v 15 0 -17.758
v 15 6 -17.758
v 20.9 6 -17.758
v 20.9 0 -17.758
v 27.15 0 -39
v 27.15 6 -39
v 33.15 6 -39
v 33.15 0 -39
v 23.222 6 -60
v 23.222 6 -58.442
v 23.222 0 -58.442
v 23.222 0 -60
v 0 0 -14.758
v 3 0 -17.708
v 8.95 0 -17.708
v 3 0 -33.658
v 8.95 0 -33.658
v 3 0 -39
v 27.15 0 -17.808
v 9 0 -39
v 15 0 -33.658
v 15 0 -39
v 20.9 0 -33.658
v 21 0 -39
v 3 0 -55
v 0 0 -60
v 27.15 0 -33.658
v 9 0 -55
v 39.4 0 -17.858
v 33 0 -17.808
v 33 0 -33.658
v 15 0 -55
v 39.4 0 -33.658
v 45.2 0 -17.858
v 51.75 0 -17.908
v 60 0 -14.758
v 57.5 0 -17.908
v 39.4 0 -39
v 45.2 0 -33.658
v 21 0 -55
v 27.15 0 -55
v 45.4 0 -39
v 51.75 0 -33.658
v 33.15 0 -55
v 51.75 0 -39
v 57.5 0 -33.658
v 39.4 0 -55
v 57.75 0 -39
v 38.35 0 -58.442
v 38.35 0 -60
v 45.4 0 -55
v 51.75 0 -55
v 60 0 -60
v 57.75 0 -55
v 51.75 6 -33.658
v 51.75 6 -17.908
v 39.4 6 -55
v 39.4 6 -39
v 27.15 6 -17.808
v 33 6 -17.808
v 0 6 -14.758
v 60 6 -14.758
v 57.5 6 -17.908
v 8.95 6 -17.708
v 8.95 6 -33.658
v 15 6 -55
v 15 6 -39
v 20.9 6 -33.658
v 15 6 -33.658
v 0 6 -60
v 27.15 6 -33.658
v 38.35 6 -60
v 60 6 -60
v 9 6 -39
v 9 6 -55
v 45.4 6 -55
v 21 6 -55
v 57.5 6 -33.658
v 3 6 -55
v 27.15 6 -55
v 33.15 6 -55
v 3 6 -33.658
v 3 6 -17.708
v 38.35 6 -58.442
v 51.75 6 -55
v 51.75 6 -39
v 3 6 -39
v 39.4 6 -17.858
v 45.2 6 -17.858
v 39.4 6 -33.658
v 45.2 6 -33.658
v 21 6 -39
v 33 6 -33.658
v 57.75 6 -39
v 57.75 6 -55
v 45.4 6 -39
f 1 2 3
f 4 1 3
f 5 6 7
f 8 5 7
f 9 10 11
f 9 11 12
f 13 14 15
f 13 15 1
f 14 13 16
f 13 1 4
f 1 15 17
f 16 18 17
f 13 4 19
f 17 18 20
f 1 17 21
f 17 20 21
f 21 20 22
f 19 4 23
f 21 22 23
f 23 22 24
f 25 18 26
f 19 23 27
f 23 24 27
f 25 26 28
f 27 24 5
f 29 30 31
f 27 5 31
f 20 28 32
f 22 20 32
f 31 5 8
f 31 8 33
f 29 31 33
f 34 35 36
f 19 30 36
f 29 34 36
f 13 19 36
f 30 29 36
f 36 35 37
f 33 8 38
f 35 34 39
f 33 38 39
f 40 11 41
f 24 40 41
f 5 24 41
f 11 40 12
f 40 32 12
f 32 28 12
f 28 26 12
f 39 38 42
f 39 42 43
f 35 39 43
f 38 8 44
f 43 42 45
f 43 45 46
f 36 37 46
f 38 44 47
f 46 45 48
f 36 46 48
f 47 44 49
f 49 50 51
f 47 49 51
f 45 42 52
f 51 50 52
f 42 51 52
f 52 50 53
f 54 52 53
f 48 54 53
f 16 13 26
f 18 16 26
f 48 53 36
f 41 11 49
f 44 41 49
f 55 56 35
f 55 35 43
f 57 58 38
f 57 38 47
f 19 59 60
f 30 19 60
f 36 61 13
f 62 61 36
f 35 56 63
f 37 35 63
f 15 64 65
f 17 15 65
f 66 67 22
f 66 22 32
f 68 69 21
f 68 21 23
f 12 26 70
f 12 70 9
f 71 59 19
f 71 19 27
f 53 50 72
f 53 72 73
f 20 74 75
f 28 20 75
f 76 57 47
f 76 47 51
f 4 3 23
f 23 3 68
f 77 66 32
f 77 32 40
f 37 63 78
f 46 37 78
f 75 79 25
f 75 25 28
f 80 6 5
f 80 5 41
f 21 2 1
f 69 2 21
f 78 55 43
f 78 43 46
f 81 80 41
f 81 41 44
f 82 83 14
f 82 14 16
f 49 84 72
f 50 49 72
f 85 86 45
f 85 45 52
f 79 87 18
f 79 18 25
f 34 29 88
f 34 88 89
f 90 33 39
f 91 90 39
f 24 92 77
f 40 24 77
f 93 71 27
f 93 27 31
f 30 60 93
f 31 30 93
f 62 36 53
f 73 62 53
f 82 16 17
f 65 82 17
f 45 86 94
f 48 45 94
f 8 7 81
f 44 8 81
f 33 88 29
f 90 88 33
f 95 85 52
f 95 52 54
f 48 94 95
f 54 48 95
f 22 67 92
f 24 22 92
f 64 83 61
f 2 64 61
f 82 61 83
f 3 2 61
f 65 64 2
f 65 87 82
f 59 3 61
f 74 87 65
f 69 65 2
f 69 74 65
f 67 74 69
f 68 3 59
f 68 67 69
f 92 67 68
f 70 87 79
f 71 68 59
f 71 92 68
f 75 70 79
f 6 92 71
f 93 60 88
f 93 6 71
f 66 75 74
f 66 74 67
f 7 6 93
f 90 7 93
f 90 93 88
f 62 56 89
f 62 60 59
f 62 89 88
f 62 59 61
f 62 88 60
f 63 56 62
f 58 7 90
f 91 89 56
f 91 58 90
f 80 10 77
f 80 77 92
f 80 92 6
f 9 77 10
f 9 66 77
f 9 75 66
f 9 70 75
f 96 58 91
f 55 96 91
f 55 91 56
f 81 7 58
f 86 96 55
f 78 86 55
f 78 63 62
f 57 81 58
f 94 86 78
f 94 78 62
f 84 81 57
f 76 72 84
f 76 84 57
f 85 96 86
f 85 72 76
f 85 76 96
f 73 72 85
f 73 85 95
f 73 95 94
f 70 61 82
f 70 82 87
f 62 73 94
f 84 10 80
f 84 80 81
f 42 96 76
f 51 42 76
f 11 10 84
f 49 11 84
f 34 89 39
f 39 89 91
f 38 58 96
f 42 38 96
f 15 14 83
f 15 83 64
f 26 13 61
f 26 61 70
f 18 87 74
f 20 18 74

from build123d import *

# Parameters (mm, degrees)
SKETCH1_W           = 60
SKETCH1_H           = 60
BOSS_EXTRUDE1_DEPTH = 6
SKETCH2_W           = 6
SKETCH2_H           = 16
SKETCH2_W_2         = 5.95
SKETCH2_H_2         = 15.95
SKETCH2_W_3         = 5.9
SKETCH2_H_3         = 15.9
SKETCH2_W_4         = 5.85
SKETCH2_H_4         = 15.85
SKETCH2_W_5         = 5.8
SKETCH2_H_5         = 15.8
SKETCH2_W_6         = 5.75
SKETCH2_H_6         = 15.75
CUT_EXTRUDE1_DEPTH  = 6
SKETCH3_W           = 15.128686335
SKETCH3_H           = 1.558081165
CUT_EXTRUDE2_DEPTH  = 6
SKETCH4_W           = 60
SKETCH4_H           = 14.757524832
CUT_EXTRUDE3_DEPTH  = 6


with BuildPart() as part:
    # Sketch1 → Boss-Extrude1 (new body)
    with BuildSketch(Plane(origin=(0, 0, 0), x_dir=(1, 0, 0), z_dir=(0, 1, 0))):
        with Locations((30, 30)):
            Rectangle(SKETCH1_W, SKETCH1_H)
    extrude(amount=BOSS_EXTRUDE1_DEPTH)

    # Sketch2 → Cut-Extrude1 (cut)
    with BuildSketch(Plane(origin=(0, 6, 0), x_dir=(1, 0, 0), z_dir=(0, 1, 0))):
        with Locations((6, 47)):
            Rectangle(SKETCH2_W, SKETCH2_H)
        with Locations((18, 47)):
            Rectangle(SKETCH2_W, SKETCH2_H)
        with Locations((30.15, 47)):
            Rectangle(SKETCH2_W, SKETCH2_H)
        with Locations((42.4, 47)):
            Rectangle(SKETCH2_W, SKETCH2_H)
        with Locations((54.75, 47)):
            Rectangle(SKETCH2_W, SKETCH2_H)
        with Locations((5.975, 25.682524832)):
            Rectangle(SKETCH2_W_2, SKETCH2_H_2)
        with Locations((17.95, 25.707524832)):
            Rectangle(SKETCH2_W_3, SKETCH2_H_3)
        with Locations((30.075, 25.732524832)):
            Rectangle(SKETCH2_W_4, SKETCH2_H_4)
        with Locations((42.3, 25.757524832)):
            Rectangle(SKETCH2_W_5, SKETCH2_H_5)
        with Locations((54.625, 25.782524832)):
            Rectangle(SKETCH2_W_6, SKETCH2_H_6)
    extrude(amount=-CUT_EXTRUDE1_DEPTH, mode=Mode.SUBTRACT)

    # Sketch3 → Cut-Extrude2 (cut)
    with BuildSketch(Plane(origin=(0, 6, 0), x_dir=(1, 0, 0), z_dir=(0, 1, 0))):
        with Locations((30.785905784, 59.220959418)):
            Rectangle(SKETCH3_W, SKETCH3_H)
    extrude(amount=-CUT_EXTRUDE2_DEPTH, mode=Mode.SUBTRACT)

    # Sketch4 → Cut-Extrude3 (cut)
    with BuildSketch(Plane(origin=(0, 6, 0), x_dir=(1, 0, 0), z_dir=(0, 1, 0))):
        with Locations((30, 7.378762416)):
            Rectangle(SKETCH4_W, SKETCH4_H)
    extrude(amount=-CUT_EXTRUDE3_DEPTH, mode=Mode.SUBTRACT)


solid = part.part
